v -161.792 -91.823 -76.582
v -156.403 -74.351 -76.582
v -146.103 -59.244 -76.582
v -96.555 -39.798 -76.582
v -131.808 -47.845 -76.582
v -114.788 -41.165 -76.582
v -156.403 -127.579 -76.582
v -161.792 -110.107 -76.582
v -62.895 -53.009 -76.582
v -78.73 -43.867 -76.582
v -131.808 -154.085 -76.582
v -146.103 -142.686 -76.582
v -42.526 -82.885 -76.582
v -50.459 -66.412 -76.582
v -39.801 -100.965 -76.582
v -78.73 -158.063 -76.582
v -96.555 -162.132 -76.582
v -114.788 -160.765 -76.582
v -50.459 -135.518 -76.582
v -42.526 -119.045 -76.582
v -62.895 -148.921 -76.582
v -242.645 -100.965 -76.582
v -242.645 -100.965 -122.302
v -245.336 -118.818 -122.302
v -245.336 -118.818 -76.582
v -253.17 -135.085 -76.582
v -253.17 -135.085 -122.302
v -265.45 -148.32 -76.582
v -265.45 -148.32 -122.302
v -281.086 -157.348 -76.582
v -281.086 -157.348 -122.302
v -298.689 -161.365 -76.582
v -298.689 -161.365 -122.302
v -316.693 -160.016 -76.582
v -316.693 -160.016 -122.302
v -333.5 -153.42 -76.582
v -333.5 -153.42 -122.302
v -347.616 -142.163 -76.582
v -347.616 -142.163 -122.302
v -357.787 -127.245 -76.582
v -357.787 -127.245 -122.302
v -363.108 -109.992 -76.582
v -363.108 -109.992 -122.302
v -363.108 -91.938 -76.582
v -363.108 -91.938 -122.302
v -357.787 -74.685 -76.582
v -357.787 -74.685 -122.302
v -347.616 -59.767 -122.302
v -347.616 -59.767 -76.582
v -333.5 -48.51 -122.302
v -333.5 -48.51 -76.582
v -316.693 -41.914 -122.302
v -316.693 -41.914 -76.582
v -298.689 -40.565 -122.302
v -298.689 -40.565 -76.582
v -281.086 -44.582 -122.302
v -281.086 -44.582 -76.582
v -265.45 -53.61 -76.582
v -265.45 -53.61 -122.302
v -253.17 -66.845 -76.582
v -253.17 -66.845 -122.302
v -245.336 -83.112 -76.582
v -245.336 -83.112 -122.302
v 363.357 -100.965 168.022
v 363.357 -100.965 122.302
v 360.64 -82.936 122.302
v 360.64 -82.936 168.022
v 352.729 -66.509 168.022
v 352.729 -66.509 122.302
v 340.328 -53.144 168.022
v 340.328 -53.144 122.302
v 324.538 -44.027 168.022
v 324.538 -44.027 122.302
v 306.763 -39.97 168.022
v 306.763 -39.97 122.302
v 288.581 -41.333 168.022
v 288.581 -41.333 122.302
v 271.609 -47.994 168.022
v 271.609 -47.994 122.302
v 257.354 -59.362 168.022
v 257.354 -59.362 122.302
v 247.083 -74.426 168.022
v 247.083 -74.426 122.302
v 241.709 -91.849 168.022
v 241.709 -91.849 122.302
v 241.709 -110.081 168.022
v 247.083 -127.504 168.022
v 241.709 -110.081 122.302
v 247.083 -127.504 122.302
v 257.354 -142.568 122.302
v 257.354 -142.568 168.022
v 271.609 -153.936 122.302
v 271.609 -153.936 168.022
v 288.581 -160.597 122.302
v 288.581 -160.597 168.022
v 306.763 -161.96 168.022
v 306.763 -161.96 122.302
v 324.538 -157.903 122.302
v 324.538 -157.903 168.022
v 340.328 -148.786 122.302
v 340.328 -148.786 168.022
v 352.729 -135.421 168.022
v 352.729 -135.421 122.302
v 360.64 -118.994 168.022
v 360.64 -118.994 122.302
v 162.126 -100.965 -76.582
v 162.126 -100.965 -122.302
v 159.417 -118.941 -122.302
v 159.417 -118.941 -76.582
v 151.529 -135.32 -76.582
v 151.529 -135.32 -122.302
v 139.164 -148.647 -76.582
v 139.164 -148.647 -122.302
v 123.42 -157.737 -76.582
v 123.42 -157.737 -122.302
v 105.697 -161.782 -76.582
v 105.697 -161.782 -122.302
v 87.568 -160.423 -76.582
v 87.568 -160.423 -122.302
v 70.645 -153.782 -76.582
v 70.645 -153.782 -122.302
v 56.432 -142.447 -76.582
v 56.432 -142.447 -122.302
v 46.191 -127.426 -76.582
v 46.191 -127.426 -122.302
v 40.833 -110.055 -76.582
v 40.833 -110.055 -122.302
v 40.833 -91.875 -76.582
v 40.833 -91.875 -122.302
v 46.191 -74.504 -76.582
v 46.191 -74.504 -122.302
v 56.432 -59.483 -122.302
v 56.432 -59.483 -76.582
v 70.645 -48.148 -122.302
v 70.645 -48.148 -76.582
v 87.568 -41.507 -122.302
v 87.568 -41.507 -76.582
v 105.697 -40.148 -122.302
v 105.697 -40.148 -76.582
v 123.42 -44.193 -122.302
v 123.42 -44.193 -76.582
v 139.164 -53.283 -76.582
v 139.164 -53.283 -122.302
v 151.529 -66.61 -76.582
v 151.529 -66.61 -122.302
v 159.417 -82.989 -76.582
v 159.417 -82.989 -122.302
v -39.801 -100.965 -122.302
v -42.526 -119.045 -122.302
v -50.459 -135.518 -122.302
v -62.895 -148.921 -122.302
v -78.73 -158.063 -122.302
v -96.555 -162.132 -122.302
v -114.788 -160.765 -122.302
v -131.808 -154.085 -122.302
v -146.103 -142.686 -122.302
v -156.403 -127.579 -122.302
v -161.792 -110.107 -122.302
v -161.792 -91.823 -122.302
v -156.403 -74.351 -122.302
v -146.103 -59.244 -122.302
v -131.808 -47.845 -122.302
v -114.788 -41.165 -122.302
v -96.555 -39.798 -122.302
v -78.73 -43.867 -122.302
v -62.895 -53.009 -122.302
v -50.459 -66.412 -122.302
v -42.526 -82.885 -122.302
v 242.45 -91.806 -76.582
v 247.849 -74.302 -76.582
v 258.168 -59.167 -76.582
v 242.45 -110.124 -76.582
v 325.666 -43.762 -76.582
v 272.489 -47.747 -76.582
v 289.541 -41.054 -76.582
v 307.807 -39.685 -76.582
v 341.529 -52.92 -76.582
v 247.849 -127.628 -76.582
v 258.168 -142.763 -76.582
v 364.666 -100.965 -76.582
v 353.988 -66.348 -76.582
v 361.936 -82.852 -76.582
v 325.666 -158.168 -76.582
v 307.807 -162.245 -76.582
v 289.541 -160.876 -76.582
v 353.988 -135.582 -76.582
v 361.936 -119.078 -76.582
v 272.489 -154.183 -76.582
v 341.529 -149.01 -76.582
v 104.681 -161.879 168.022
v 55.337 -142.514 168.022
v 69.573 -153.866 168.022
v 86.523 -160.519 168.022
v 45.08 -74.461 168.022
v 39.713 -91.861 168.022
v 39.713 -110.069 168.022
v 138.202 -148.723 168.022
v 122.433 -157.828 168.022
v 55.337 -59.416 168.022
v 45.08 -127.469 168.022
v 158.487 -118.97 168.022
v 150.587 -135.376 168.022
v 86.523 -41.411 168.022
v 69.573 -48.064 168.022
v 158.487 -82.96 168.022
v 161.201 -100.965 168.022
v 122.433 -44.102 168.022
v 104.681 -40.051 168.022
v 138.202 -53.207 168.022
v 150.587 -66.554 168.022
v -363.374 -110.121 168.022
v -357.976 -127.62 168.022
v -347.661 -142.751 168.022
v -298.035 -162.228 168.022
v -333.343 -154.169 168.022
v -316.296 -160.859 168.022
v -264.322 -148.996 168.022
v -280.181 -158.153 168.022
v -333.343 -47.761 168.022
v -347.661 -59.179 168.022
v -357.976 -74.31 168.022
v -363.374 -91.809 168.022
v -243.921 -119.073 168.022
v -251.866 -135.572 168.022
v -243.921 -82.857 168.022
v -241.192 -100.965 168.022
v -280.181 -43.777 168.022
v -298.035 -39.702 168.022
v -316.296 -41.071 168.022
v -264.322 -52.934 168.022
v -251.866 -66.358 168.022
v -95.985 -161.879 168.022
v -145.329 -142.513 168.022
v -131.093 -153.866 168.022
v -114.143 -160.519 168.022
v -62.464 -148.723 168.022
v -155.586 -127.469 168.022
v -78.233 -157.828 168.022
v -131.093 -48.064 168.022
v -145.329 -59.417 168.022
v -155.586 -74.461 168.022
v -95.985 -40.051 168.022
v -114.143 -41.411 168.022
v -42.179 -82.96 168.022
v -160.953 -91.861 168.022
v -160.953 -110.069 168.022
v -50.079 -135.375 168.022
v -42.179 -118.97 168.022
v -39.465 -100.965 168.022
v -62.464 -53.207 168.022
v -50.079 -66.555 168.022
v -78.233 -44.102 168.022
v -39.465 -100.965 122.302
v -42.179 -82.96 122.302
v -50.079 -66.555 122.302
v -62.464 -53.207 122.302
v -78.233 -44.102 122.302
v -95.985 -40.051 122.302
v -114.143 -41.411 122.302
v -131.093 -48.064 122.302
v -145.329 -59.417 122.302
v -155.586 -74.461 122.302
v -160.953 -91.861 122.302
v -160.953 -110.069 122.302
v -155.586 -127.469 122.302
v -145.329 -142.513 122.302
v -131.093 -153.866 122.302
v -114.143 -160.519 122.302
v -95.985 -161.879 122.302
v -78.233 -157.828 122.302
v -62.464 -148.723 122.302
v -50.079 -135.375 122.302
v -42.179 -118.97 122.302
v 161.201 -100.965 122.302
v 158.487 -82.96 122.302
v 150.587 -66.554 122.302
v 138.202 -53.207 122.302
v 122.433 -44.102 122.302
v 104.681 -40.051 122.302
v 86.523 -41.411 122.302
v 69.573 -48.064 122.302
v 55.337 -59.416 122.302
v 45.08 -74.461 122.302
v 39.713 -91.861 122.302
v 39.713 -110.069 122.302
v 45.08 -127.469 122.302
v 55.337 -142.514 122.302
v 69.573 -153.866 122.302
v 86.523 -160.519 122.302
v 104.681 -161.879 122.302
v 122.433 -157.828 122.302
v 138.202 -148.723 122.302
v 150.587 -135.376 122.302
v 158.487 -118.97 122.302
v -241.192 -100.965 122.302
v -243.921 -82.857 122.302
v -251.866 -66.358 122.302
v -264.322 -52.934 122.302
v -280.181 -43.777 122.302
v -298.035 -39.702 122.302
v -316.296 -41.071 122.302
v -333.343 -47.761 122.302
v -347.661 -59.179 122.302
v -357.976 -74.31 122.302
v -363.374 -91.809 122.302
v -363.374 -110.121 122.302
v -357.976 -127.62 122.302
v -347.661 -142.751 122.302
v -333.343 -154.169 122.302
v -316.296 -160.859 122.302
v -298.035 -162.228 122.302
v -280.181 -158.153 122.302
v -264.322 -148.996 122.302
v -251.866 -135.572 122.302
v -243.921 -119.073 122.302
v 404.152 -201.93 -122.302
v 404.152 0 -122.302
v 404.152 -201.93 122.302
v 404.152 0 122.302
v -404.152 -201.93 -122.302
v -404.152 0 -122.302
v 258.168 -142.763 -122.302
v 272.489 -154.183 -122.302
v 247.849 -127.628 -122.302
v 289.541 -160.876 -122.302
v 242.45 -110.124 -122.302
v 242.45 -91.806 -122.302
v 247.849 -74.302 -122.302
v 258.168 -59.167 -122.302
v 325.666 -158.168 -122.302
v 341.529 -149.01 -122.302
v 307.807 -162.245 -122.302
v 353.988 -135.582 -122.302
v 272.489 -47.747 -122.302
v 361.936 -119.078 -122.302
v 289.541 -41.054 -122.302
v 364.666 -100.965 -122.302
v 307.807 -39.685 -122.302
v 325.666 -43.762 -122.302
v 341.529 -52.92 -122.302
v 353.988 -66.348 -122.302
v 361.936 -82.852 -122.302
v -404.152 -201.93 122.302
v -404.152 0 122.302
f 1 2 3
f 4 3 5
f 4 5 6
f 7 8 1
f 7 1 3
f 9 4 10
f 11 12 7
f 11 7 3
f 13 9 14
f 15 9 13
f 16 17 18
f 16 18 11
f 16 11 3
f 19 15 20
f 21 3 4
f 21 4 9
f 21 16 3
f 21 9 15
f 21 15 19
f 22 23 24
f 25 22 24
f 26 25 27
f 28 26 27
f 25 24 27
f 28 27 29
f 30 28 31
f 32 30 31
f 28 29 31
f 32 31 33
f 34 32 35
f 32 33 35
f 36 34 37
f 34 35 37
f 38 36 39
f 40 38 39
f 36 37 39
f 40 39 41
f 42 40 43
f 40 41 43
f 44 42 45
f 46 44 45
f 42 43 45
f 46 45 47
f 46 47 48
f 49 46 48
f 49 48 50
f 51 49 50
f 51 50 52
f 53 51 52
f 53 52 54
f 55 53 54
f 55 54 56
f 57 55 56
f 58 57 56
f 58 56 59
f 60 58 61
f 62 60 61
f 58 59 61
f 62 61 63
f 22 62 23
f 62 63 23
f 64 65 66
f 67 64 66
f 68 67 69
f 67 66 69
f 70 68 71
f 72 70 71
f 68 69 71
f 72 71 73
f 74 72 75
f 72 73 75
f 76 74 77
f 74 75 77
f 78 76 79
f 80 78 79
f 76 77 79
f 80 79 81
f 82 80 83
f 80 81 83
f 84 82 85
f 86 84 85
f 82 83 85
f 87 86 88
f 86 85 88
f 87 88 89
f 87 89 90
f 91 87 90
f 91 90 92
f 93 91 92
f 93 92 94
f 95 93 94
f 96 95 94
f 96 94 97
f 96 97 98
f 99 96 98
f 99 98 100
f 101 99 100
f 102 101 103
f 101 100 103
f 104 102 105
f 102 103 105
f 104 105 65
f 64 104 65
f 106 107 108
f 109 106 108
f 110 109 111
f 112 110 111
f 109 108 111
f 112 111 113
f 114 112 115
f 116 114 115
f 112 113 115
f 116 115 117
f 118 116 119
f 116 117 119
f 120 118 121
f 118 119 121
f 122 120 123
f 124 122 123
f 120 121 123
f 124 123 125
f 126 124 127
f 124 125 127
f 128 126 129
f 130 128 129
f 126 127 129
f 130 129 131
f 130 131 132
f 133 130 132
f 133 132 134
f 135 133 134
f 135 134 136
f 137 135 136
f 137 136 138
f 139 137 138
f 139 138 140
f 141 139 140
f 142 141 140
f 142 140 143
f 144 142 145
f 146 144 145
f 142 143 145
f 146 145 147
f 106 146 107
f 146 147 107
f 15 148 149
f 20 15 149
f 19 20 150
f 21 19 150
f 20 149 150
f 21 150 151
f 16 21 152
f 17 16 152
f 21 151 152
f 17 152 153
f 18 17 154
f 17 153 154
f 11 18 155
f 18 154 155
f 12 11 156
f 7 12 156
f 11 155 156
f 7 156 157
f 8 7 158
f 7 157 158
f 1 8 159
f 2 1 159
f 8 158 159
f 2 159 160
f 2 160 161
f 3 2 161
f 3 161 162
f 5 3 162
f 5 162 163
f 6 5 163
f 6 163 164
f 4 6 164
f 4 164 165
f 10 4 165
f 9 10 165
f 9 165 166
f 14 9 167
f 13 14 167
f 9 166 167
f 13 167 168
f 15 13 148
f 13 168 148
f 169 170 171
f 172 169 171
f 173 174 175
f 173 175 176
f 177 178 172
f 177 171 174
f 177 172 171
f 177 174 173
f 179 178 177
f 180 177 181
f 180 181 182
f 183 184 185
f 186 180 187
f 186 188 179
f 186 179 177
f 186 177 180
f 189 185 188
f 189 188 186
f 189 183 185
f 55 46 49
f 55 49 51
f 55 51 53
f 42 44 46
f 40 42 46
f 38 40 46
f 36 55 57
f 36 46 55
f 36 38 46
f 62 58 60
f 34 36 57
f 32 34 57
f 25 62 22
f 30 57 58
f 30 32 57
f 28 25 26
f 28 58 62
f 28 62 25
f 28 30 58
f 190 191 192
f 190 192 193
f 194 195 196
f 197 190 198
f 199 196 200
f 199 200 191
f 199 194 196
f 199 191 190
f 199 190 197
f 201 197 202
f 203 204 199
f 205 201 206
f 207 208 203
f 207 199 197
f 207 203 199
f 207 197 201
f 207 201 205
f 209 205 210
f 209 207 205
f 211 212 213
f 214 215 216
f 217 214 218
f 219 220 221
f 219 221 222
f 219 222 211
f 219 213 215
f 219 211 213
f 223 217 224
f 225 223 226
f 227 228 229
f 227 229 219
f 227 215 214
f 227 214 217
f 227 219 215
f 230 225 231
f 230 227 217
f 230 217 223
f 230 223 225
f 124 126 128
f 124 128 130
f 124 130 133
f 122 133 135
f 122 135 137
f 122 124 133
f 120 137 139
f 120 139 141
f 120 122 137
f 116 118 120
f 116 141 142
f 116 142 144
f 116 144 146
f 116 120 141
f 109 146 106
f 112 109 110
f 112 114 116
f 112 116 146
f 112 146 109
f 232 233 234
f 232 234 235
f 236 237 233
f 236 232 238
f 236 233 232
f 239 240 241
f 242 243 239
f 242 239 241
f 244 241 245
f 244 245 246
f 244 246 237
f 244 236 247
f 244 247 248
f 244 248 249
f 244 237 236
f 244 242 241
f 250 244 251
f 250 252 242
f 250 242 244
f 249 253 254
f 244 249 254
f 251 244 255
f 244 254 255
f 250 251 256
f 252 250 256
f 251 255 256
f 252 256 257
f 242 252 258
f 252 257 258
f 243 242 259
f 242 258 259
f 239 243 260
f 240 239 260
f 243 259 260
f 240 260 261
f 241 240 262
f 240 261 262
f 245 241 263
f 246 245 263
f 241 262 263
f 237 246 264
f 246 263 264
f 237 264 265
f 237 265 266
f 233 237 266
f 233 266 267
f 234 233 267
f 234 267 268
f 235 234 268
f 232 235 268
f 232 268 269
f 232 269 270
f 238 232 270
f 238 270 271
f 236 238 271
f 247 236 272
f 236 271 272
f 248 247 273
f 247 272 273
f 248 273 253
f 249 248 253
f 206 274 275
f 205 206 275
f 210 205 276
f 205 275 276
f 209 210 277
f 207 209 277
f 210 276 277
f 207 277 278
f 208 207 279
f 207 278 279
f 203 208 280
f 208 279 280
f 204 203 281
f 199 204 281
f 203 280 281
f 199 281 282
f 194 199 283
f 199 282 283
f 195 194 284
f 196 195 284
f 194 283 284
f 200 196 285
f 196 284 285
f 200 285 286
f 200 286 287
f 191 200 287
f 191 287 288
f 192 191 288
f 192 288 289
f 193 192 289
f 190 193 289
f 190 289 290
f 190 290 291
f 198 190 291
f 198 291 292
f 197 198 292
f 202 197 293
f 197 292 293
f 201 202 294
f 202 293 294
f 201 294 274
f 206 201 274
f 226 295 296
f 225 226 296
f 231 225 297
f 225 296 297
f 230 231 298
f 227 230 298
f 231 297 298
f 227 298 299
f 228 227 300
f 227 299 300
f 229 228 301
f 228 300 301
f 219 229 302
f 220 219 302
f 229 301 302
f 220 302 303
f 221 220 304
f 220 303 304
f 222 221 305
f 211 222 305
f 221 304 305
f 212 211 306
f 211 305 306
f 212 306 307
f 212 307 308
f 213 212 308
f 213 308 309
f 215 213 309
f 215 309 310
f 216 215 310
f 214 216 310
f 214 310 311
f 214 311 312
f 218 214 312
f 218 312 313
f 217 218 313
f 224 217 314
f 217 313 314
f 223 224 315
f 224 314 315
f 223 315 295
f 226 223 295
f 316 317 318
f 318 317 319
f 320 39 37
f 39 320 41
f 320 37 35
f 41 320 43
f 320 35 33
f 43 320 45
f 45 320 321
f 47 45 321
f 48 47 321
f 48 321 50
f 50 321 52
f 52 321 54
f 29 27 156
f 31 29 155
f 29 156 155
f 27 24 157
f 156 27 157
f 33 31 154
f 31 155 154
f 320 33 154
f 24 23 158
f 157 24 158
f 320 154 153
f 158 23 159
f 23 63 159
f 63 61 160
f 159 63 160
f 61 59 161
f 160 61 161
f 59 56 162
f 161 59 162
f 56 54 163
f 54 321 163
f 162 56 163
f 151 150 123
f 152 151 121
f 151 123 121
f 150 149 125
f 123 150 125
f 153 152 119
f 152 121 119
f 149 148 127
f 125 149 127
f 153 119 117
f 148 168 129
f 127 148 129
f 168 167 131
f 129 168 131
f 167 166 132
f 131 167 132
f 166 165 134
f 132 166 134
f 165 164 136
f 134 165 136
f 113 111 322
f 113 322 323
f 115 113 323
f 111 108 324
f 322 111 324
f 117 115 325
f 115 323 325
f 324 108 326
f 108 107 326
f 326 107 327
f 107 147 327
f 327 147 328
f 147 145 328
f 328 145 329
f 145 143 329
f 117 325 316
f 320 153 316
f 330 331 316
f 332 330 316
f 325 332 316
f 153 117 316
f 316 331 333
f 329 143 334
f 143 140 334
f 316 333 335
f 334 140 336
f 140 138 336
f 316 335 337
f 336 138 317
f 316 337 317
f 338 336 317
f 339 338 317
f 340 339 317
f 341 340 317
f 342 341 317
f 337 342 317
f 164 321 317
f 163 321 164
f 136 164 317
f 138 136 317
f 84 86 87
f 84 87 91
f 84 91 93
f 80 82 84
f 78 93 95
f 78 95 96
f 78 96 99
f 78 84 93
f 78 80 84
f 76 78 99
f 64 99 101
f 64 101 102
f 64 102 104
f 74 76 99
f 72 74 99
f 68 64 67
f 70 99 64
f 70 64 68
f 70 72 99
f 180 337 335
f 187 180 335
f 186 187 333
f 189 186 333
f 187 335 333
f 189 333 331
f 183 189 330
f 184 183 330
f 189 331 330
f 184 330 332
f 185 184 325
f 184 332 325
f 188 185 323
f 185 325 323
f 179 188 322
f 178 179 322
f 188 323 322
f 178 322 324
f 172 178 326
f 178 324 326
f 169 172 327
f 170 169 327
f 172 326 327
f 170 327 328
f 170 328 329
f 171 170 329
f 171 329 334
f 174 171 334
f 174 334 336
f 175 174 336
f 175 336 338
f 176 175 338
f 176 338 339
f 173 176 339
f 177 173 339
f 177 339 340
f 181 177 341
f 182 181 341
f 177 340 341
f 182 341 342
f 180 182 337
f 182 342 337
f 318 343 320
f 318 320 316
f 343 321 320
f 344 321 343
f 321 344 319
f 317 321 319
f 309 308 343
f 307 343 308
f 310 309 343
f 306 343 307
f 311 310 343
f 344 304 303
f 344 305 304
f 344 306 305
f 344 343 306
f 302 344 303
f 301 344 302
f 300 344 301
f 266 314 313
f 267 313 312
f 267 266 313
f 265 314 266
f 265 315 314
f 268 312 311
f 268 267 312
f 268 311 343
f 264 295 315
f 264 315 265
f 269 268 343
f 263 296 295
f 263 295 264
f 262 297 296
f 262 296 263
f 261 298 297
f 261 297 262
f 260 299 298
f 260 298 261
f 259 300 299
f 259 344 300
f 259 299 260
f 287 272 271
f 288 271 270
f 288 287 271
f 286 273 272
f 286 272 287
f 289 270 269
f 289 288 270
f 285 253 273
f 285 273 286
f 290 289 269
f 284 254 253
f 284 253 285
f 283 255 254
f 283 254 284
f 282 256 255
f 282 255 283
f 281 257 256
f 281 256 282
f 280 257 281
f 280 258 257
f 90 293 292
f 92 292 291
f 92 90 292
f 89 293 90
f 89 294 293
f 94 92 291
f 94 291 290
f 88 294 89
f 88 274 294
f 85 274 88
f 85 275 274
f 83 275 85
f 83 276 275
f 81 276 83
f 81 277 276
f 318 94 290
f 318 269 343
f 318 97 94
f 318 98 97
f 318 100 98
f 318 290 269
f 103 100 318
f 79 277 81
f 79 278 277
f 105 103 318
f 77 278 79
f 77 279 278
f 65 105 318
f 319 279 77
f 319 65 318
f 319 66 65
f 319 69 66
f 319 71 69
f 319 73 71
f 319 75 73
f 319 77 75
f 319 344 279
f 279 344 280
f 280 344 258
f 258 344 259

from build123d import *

# Parameters (mm, degrees)
F0_W     = 808.303834
F0_H     = 244.603918
F1_DEPTH = 201.93
F2_R     = 61.085102
F2_R_2   = 61.085249
F2_R_3   = 61.165723
F2_R_4   = 61.434425
F3_DEPTH = 45.72
F4_R     = 61.451385
F4_R_2   = 60.987438
F4_R_3   = 61.338193
F4_R_4   = 60.569848
F5_DEPTH = 45.72


with BuildPart() as f1:
    # F0 (on Front) → F1 (new body)
    with BuildSketch(Plane.XZ):
        Rectangle(F0_W, F0_H)
    extrude(amount=F1_DEPTH)

    # F2 (on face) → F3 (join)
    with BuildSketch(Plane.XY.offset(122.301959)):
        with Locations((-100.550018, -100.965)):
            Circle(F2_R)
        with Locations((100.115694, -100.965)):
            Circle(F2_R_2)
        with Locations((302.191652, -100.965)):
            Circle(F2_R_3)
        with Locations((-302.625977, -100.965)):
            Circle(F2_R_4)
    extrude(amount=F3_DEPTH)

    # F4 (on face) → F5 (cut)
    with BuildSketch(Plane(origin=(0, 0, -122.301959), x_dir=(1, 0, 0), z_dir=(0, 0, -1))):
        with Locations((303.214967, 100.965)):
            Circle(F4_R)
        with Locations((101.139009, 100.965)):
            Circle(F4_R_2)
        with Locations((-101.139016, 100.965)):
            Circle(F4_R_3)
        with Locations((-303.214975, 100.965)):
            Circle(F4_R_4)
    extrude(amount=-F5_DEPTH, mode=Mode.SUBTRACT)


solid = f1.part
